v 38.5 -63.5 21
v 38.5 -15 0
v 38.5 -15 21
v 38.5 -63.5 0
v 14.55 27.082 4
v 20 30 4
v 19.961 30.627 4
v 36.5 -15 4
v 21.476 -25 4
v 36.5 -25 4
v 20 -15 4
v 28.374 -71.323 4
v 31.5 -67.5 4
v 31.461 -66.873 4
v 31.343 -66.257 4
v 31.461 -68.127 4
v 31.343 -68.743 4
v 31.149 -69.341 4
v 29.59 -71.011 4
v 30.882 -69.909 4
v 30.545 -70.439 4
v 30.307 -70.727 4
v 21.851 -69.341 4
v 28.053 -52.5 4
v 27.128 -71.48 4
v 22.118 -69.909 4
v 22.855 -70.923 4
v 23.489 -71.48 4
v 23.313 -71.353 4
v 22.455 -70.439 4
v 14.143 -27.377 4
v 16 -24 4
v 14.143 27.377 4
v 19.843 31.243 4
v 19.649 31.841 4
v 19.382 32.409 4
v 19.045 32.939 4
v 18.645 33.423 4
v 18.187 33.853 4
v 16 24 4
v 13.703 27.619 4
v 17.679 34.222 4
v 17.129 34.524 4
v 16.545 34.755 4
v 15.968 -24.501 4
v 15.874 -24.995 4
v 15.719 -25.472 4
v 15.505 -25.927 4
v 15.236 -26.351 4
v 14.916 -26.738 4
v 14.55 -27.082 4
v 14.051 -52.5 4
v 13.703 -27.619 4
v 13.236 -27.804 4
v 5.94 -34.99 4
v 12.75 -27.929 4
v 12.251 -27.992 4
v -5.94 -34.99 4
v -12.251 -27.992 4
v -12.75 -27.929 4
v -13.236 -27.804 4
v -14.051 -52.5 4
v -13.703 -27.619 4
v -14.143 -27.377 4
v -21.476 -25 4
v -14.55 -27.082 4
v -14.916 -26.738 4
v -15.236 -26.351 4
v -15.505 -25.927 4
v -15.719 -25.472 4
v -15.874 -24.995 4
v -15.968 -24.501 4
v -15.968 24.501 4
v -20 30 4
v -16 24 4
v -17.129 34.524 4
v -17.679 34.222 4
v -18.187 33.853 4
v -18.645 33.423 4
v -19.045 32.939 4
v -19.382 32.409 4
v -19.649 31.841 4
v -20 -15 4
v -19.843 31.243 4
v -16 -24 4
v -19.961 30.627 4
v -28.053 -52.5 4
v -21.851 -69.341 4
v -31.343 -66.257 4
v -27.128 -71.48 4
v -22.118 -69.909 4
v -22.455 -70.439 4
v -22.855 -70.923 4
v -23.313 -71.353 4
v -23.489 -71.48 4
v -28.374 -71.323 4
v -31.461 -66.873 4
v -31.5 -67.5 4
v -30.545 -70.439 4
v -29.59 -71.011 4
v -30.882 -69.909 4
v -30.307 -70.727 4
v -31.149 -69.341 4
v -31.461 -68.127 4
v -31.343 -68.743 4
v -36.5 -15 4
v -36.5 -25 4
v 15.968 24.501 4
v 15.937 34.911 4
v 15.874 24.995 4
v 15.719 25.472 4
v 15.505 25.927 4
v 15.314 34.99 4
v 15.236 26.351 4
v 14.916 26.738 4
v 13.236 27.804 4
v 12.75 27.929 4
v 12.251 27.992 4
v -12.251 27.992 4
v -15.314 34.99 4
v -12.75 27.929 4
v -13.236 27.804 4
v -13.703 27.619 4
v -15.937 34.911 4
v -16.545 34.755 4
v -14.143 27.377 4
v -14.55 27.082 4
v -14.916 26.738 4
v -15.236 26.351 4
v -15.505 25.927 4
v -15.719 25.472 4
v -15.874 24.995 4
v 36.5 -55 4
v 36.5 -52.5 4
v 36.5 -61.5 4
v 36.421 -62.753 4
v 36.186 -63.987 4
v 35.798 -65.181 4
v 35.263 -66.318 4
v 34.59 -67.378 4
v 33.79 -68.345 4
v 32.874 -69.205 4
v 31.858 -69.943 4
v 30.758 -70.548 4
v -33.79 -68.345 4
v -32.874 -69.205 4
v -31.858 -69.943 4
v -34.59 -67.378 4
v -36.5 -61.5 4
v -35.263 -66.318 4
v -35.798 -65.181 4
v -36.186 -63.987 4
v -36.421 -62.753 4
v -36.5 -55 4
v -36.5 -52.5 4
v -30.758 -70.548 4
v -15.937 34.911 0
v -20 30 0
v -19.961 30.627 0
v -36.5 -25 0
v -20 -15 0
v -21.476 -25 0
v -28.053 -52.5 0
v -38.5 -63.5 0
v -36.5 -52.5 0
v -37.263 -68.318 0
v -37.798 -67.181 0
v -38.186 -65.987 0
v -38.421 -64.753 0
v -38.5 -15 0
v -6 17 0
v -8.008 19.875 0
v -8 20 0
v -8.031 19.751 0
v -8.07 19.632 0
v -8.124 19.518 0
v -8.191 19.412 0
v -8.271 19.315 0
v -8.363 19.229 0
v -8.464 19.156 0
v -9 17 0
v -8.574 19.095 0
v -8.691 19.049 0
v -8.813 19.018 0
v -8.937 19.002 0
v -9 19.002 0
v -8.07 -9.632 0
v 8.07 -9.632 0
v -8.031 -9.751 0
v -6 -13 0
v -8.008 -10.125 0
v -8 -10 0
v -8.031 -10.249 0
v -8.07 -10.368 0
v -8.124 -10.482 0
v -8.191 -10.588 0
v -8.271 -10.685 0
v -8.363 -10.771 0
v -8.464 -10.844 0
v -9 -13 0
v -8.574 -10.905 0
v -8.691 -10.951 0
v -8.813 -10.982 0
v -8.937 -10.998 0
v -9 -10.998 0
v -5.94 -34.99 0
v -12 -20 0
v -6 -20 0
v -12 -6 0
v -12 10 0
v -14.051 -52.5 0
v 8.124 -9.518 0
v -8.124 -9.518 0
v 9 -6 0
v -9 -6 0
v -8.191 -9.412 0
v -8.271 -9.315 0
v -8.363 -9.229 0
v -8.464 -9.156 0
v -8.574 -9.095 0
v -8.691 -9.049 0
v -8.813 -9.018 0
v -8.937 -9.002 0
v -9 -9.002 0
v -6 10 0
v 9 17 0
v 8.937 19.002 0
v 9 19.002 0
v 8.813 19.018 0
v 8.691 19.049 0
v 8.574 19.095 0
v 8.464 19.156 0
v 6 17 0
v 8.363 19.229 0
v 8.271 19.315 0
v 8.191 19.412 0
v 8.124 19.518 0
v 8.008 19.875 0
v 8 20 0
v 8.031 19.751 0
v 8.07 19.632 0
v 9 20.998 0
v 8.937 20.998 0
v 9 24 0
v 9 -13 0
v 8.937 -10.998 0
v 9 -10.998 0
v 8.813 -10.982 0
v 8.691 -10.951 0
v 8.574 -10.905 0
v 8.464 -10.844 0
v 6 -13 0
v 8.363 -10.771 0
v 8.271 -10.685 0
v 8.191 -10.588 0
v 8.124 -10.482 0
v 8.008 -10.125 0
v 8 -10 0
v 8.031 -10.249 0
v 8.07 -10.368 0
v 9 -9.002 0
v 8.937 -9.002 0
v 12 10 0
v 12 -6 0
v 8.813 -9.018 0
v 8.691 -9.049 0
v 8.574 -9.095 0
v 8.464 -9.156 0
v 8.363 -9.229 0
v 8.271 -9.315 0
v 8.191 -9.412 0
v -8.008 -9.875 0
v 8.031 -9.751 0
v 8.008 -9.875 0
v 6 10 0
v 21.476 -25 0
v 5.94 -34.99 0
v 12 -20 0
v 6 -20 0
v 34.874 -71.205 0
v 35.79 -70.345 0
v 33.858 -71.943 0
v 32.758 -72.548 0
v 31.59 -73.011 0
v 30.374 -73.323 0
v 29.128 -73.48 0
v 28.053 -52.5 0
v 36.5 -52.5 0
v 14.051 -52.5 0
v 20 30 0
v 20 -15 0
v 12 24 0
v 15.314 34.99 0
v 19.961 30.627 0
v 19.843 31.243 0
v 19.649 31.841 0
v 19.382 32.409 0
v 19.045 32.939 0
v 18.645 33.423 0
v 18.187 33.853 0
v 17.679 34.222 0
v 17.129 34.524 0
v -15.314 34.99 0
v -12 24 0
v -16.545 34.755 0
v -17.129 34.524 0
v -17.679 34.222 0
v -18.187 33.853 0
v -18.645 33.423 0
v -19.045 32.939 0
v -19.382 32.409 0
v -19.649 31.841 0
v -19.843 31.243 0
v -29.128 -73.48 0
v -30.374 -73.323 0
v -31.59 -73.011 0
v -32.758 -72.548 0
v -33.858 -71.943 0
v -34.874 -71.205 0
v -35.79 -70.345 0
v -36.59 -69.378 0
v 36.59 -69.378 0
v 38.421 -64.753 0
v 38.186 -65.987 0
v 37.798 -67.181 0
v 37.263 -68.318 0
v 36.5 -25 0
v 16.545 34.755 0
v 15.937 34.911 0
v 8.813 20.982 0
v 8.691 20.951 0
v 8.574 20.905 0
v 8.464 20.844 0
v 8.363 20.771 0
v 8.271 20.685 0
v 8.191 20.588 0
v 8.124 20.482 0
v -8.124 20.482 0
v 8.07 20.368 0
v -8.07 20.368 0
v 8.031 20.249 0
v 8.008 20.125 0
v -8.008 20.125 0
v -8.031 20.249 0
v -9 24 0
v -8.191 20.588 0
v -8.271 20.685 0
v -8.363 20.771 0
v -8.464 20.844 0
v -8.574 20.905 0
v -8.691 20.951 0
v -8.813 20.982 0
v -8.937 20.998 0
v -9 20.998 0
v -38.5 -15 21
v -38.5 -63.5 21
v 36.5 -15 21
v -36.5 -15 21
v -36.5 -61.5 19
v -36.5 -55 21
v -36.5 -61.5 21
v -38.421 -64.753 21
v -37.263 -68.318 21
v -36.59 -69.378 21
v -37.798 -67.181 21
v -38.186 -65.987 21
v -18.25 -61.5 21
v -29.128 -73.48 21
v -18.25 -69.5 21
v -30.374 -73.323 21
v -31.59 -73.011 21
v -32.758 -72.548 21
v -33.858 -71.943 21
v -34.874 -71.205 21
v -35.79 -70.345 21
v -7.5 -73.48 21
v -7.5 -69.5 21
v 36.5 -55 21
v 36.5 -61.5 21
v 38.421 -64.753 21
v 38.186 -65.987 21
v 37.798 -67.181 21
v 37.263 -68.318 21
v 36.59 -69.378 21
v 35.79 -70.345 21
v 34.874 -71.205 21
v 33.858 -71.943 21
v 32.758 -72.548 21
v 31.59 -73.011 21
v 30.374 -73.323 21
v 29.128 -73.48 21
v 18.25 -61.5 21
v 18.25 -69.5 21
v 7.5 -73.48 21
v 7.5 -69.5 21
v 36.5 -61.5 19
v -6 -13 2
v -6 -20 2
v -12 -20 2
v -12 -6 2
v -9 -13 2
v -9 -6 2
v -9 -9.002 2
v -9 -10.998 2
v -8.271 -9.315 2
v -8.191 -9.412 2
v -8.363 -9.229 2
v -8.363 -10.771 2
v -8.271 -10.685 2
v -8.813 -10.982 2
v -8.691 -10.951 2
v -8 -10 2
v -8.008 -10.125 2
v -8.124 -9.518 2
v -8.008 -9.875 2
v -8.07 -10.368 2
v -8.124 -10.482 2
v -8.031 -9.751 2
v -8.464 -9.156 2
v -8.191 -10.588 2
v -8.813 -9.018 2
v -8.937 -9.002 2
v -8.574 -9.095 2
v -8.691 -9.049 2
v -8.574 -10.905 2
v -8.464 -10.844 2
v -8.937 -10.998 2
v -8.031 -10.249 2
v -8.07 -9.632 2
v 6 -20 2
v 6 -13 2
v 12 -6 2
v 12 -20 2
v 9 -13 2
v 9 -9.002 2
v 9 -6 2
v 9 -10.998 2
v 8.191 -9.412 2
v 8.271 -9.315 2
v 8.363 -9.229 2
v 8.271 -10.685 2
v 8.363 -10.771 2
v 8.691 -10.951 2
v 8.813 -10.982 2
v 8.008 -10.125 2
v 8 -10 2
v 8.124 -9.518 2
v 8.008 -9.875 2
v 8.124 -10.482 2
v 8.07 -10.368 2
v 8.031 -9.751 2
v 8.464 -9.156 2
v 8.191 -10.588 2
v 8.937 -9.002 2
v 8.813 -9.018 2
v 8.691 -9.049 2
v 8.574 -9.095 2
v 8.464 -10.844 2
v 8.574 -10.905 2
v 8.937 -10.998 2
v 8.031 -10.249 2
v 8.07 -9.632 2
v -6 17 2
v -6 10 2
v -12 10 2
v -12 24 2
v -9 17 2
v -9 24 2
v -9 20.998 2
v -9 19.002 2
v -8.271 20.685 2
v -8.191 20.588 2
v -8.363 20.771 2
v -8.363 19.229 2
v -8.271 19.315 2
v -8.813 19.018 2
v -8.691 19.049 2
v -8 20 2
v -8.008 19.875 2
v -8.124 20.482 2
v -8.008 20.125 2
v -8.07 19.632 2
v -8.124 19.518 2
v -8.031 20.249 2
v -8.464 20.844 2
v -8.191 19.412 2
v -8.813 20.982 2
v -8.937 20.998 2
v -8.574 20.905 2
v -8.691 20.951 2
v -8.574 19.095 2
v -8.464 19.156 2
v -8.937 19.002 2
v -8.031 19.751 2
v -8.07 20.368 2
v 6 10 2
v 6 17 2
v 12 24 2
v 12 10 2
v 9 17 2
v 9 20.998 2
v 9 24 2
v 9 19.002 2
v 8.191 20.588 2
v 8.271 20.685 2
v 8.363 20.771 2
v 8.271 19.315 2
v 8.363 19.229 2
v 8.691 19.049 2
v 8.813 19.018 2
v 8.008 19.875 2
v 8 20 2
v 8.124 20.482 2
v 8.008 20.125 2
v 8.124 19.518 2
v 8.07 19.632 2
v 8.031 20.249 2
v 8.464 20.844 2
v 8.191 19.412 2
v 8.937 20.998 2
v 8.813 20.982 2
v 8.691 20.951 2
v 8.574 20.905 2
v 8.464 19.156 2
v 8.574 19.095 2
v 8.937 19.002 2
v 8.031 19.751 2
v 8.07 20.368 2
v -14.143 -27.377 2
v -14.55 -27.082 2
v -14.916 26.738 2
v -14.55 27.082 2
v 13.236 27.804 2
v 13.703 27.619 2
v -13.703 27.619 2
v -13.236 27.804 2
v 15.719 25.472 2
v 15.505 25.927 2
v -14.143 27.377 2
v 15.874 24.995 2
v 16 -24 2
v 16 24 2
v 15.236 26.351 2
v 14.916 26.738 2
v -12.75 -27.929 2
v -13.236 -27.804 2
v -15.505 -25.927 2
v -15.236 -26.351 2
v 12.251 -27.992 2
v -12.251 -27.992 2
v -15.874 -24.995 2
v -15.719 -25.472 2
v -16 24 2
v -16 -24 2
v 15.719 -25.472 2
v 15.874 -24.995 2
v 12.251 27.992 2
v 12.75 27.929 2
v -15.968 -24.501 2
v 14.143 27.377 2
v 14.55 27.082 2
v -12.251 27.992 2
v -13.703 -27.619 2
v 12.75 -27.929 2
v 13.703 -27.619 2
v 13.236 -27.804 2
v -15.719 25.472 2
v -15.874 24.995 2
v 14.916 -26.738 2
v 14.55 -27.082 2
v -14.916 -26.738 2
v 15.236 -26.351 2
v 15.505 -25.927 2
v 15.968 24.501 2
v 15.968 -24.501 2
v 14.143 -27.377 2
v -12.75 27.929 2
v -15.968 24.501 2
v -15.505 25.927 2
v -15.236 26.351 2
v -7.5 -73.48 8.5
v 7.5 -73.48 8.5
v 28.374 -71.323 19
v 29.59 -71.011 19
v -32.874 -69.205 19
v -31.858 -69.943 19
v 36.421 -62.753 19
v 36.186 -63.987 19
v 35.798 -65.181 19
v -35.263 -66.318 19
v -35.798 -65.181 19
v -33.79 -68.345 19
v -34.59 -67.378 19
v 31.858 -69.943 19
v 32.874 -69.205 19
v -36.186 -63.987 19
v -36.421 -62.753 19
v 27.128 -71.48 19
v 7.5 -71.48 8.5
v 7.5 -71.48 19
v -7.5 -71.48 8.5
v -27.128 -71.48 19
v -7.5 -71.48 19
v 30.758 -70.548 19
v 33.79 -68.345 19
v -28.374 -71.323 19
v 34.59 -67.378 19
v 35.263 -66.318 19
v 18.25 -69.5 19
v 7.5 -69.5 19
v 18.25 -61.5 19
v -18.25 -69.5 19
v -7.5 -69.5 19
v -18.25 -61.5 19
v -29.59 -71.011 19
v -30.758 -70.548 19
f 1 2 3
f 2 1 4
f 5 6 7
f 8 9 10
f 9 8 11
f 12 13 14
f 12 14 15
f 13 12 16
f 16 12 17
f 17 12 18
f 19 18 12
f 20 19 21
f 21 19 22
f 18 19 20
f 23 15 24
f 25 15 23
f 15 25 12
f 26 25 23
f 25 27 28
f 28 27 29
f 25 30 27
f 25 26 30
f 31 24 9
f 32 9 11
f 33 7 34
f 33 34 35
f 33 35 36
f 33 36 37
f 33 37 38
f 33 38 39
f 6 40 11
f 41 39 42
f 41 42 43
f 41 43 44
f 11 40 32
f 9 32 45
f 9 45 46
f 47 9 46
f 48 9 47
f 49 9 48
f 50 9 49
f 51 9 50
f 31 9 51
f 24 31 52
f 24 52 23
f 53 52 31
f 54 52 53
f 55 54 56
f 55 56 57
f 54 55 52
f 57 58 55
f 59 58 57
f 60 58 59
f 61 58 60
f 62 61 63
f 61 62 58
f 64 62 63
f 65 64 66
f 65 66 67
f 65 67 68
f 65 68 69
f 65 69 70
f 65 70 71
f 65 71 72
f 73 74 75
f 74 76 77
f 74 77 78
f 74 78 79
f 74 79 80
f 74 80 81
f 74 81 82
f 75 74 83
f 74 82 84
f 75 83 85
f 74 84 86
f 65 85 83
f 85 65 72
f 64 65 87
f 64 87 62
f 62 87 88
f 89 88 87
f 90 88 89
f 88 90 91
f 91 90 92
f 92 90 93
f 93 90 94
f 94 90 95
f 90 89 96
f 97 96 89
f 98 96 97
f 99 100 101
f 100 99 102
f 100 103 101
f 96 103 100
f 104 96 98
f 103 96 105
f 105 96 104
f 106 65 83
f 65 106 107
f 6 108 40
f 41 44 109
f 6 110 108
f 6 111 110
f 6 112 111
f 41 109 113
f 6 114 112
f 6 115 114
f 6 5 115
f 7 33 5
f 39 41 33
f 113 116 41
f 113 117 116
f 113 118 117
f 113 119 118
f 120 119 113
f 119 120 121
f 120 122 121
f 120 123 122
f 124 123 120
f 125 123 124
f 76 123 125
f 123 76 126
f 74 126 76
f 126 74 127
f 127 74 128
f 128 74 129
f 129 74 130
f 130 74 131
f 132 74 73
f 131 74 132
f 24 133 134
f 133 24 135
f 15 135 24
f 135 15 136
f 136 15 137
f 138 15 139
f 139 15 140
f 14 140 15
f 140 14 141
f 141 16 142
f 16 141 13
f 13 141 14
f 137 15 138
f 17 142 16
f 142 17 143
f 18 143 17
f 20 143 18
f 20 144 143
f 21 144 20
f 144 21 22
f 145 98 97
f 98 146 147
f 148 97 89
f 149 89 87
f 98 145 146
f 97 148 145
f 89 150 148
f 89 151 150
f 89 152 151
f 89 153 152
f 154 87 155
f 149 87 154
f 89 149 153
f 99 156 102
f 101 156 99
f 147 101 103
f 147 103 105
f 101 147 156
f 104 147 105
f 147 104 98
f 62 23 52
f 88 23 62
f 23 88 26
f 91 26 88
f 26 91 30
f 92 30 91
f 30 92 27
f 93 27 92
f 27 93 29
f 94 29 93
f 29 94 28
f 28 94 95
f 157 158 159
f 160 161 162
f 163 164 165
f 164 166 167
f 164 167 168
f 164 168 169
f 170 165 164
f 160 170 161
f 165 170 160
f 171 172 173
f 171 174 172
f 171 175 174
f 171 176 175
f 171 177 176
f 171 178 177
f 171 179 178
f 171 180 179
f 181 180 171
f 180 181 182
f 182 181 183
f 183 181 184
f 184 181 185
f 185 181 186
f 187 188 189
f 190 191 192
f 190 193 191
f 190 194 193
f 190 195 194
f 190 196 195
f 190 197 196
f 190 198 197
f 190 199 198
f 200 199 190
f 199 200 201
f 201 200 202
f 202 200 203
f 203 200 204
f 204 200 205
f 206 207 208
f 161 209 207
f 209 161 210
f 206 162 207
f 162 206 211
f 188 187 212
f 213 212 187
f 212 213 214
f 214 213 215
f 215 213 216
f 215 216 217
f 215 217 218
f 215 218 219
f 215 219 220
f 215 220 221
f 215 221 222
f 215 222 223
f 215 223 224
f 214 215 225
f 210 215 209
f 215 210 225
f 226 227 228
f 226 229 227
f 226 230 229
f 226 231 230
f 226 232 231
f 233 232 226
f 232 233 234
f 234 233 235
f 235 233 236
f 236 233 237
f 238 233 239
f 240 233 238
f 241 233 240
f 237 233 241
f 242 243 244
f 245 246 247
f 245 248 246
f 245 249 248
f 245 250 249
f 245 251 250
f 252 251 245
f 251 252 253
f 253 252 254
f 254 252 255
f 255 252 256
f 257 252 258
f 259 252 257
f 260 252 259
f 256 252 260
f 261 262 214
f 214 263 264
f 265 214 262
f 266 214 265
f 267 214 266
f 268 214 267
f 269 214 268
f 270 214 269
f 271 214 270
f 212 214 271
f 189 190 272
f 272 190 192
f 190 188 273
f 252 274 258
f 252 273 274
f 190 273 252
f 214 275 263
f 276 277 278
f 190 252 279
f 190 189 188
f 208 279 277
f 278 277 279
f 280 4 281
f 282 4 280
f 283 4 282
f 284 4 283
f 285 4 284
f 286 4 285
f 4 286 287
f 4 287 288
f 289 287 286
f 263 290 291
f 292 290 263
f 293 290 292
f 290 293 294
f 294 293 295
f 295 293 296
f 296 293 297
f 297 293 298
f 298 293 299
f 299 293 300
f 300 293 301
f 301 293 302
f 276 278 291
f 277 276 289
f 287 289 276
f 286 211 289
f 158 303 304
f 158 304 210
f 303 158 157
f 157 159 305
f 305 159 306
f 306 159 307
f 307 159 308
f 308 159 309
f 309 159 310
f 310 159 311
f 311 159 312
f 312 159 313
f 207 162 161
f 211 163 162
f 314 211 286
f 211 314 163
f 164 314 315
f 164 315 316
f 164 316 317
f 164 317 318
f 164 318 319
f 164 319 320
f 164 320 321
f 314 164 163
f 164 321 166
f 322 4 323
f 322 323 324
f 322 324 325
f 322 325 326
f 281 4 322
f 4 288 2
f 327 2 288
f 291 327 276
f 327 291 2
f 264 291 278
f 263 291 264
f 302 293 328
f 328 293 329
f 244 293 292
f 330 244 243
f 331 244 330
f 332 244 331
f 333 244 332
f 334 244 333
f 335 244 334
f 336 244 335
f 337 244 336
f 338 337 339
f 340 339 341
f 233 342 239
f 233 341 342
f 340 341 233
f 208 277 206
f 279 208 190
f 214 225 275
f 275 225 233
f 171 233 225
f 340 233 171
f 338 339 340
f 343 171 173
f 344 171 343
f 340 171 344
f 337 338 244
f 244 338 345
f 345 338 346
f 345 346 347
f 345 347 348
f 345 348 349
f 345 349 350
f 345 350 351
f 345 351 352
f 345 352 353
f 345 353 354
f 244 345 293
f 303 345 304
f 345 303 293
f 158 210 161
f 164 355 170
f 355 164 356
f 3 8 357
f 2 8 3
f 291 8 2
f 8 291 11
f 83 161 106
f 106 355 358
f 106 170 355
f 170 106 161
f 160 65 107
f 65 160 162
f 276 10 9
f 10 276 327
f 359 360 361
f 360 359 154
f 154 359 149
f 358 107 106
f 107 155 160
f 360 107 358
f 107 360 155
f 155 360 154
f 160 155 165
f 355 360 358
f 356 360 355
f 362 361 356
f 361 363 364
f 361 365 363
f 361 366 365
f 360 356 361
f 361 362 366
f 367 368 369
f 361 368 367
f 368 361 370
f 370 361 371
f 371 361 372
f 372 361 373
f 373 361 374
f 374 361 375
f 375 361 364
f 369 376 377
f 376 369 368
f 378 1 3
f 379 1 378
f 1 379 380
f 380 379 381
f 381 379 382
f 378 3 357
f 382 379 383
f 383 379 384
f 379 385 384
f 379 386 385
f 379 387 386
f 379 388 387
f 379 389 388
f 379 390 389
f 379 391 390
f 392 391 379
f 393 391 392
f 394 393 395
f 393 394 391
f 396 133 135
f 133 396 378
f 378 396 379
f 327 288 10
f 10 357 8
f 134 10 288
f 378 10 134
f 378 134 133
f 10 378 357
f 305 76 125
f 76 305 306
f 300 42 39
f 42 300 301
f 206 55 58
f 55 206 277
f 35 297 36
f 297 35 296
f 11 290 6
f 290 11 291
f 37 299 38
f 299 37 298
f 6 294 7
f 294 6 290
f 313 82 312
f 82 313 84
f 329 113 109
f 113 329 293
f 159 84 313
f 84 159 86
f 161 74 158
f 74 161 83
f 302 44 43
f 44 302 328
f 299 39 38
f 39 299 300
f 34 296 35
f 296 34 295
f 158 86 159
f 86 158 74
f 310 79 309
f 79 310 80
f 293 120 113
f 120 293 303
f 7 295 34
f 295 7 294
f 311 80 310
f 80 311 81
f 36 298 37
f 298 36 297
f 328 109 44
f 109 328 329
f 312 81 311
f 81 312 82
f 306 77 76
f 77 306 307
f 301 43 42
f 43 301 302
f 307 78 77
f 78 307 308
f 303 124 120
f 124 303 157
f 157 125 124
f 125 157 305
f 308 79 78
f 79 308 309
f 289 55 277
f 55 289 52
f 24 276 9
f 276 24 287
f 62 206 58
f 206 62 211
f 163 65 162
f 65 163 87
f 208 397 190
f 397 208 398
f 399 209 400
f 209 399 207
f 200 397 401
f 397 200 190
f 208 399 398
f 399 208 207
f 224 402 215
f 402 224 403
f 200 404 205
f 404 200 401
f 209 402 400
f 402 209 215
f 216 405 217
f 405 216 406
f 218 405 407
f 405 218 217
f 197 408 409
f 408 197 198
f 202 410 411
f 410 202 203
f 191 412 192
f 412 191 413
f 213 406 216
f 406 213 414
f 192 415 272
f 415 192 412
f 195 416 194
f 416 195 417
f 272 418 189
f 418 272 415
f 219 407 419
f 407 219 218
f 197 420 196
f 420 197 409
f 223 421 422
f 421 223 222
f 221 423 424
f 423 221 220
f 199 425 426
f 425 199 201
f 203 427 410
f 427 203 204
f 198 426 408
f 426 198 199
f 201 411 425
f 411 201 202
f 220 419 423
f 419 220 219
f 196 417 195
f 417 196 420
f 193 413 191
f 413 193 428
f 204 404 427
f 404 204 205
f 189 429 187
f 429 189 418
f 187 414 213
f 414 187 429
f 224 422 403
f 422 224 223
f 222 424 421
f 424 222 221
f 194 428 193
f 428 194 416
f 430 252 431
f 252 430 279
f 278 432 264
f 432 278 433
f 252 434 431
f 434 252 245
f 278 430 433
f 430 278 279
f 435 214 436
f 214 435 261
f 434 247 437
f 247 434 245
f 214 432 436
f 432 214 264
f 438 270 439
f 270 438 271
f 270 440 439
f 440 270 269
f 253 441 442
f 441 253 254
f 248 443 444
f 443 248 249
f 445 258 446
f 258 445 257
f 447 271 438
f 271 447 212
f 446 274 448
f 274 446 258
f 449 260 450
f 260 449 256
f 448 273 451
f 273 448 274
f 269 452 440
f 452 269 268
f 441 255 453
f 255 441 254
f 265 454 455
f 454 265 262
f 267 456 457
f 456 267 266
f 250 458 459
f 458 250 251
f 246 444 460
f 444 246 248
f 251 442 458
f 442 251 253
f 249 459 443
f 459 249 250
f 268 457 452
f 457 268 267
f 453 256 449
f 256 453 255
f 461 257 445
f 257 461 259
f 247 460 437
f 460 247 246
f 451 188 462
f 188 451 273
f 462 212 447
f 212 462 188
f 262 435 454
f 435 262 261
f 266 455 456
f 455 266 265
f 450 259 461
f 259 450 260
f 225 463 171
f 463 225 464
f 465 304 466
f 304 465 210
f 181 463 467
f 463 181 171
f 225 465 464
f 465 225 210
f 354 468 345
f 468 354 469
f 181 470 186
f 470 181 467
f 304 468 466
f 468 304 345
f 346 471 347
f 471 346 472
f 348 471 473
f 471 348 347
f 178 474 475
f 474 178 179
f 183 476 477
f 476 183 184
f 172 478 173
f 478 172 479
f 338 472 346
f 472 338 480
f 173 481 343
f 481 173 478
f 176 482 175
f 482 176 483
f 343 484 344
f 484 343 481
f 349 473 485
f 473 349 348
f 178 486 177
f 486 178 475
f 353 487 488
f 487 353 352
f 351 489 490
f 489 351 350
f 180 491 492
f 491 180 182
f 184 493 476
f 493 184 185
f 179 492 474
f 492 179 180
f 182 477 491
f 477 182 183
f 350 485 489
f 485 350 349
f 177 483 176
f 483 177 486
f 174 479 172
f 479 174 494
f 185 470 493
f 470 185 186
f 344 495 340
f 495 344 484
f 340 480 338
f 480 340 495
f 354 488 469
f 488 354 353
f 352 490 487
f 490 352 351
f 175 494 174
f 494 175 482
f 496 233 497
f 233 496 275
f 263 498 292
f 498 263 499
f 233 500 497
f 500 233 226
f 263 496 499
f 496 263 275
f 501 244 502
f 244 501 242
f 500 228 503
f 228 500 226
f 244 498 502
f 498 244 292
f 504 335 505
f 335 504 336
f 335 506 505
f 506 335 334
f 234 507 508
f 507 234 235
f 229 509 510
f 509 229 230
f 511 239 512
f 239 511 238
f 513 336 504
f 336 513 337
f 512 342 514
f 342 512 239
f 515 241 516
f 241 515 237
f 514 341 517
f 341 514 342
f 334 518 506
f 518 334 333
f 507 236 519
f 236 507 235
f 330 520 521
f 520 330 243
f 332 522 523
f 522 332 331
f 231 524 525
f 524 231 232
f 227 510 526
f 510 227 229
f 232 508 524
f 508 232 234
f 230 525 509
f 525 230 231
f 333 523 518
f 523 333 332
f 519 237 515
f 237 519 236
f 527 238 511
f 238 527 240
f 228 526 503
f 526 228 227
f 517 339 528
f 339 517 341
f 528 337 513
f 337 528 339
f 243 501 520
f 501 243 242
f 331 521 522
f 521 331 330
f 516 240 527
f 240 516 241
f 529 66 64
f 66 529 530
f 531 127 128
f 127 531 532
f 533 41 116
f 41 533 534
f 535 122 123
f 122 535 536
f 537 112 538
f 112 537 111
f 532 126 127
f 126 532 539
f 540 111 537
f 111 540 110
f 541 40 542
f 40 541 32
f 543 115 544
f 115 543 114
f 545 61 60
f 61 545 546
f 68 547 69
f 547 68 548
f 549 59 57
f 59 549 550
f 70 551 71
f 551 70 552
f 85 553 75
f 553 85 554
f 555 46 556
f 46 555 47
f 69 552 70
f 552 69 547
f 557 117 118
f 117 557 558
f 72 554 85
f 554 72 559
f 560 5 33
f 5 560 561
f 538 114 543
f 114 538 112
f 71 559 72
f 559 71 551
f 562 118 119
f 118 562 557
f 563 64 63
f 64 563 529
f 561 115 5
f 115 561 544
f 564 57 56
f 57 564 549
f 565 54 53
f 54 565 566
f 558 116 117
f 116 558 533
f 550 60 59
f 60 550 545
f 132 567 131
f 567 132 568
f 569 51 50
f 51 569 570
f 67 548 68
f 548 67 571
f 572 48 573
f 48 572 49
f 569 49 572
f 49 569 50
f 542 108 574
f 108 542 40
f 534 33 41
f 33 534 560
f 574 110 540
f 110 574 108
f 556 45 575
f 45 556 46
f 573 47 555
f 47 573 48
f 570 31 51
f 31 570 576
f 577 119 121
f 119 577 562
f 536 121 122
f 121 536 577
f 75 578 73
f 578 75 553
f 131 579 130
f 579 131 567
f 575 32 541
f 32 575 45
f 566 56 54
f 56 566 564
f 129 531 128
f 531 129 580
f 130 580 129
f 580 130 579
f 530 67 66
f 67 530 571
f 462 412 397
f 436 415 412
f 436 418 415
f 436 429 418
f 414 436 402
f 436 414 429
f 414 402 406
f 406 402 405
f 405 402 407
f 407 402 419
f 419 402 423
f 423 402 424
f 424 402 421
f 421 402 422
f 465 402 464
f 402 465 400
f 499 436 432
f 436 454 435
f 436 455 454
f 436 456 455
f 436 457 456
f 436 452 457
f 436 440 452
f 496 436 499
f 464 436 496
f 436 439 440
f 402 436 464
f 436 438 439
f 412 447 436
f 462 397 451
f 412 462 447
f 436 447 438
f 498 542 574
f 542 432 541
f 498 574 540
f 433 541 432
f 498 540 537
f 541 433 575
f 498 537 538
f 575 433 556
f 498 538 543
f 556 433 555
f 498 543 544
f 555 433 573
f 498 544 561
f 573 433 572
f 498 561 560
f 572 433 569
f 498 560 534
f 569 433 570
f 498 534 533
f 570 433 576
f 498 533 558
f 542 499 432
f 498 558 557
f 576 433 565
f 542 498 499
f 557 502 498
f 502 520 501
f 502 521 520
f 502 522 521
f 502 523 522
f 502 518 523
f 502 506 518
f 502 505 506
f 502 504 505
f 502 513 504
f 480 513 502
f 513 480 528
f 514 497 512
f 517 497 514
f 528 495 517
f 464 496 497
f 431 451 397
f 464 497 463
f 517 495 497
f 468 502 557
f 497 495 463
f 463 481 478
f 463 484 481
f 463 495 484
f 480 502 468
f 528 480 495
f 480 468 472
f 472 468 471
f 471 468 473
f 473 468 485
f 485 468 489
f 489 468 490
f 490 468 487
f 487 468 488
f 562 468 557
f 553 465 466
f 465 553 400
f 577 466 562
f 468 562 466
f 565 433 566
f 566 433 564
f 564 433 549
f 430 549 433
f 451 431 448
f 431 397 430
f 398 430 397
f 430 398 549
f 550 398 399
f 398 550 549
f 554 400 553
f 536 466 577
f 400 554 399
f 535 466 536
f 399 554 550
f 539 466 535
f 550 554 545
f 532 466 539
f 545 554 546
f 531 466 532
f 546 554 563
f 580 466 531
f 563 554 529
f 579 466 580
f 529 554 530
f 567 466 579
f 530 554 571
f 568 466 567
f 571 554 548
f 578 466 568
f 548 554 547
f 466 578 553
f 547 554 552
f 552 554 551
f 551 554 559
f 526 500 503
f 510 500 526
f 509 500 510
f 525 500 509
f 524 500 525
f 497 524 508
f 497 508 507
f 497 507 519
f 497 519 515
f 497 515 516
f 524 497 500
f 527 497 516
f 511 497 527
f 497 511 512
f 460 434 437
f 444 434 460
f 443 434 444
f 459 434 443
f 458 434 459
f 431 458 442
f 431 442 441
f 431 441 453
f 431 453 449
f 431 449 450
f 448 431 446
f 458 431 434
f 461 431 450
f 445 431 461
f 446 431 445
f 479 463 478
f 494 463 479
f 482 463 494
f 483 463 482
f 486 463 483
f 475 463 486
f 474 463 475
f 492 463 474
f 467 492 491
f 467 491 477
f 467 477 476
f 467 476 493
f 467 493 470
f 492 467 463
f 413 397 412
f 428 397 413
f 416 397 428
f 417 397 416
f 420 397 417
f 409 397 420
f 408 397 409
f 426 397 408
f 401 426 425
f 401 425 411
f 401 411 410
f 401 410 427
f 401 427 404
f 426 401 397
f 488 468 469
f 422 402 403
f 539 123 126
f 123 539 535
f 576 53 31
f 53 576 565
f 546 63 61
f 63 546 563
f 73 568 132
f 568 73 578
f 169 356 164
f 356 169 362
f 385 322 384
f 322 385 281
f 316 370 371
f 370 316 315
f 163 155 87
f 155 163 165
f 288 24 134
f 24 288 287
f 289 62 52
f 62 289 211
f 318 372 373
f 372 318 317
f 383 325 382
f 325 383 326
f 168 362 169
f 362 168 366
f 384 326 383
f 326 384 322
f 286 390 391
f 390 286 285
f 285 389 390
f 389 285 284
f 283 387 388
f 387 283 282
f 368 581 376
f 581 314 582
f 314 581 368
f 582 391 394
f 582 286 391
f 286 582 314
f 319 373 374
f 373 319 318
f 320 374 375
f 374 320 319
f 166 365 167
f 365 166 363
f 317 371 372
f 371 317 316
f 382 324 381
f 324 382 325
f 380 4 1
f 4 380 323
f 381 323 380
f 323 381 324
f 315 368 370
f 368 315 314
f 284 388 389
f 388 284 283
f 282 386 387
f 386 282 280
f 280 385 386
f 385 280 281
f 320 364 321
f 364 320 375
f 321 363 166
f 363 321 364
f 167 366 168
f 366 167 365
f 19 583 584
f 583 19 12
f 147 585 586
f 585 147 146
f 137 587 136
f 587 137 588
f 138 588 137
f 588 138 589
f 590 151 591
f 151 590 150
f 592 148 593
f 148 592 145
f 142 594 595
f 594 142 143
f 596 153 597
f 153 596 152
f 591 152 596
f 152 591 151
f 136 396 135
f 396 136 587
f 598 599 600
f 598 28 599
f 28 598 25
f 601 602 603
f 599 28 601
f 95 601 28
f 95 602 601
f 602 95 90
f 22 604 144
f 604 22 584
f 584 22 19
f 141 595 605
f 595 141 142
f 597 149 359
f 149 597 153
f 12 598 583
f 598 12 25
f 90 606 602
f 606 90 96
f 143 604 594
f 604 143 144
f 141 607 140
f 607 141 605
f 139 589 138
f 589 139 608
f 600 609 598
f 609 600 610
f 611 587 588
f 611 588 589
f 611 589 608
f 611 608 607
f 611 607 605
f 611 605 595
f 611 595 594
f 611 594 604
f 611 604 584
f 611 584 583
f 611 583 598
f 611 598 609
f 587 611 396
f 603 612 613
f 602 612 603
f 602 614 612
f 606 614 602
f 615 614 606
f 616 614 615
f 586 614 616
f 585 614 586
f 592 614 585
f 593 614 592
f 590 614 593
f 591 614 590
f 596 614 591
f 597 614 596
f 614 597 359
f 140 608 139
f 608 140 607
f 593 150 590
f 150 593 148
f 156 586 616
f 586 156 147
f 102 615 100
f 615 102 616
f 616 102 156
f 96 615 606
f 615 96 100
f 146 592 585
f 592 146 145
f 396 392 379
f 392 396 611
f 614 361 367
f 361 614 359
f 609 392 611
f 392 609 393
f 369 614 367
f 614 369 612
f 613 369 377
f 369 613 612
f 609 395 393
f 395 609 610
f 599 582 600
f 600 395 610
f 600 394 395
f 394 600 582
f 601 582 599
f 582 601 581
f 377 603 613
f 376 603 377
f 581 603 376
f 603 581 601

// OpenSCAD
phone_width = 73;
phone_length = 143;
phone_height = 15;
radius_phone = 10;

/* [Hidden] */
height = 4;
radius = 5;

$fn=50;

//phone();

difference() {
    union() {
        difference() {
            base_plate();
        }
        lower_connector();
        mirror([1,0,0]) lower_connector();
        // No upper connector
        //upper_connector();
        middle_part();
    }
    translate([0,0,height-2]) scale([0.8,0.8,1]) base_plate(); 
    mount_grid();
}

lower_part();
// No upper part
//upper_part();


module phone() {    
    color("blue", 0.2) hull() {
        translate([phone_width/2-radius_phone, phone_length/2-radius_phone, height]) cylinder(r=radius_phone,h=phone_height);
        translate([phone_width/2-radius_phone, -phone_length/2+radius_phone, height]) cylinder(r=radius_phone,h=phone_height);
        translate([-phone_width/2+radius_phone, phone_length/2-radius_phone, height]) cylinder(r=radius_phone,h=phone_height);
        translate([-phone_width/2+radius_phone, -phone_length/2+radius_phone, height]) cylinder(r=radius_phone,h=phone_height);
    }
}

module base_plate() {
    hull() {
        translate([15, 30, 0]) cylinder(r=radius,h=height);
        translate([15, -30, 0]) cylinder(r=radius,h=height);
        translate([-15, 30, 0]) cylinder(r=radius,h=height);
        translate([-15, -30, 0]) cylinder(r=radius,h=height);
    }
}

module upper_connector() {
    hull() {
        translate([0, 20, height/2]) cube([4*radius, 4*radius, height], center = true);
        translate([0, phone_length/2, height/2]) cube([2*radius, 2*radius, height], center = true);
    }
}

module upper_part() {
    translate([0, phone_length/2+radius, 1]) rotate([0,90,0]) {
        hull() {
            cylinder(r=1,h=2*radius, center=true);
            translate([-phone_height+2, 0, 0]) cylinder(r=0.5,h=2*radius, center=true);
        }        
        translate([-phone_height-4, 0, 0]) difference() {
            cylinder(r=6, h=2*radius, center=true);
            cylinder(r=5, h=2*radius, center=true);
            translate([-10,0.5,-10]) cube([20, 10, 20]);
            translate([-15,-12,-10]) rotate([0,0,45]) cube([20, 10, 20]);
        }
        #translate([-phone_height-12,-5.5,-radius]) rotate([0,0,45])  cube([radius, 1, 2*radius]);
    }
}

module lower_connector() {
    hull() {
        translate([10, -20, 0]) cylinder(r=2*radius,h=height);
        translate([phone_width/2-10, -phone_length/2+4, 0]) cylinder(r=radius,h=height);
    }
    // No rotation of lower part
    //translate([phone_width/2-10, -phone_length/2+4, 0]) cylinder(r=radius,h=7);
}

module lower_part() {
    // No rotation of lower part
    rotate([/*-5*/0,0,0]) difference() {
        hull() {
            translate([0, -phone_length/2+18, (phone_height + 2+height)/2]) cube([phone_width + 4, 2, phone_height + 2+height], center=true);
            translate([-phone_width/2+radius+3, -phone_length/2+radius_phone - 2, 0]) cylinder(r=radius_phone,h=phone_height + 2+height);
            translate([phone_width/2-radius-3, -phone_length/2+radius_phone - 2, 0]) cylinder(r=radius_phone,h=phone_height + 2+height);
        }
        phone();
        // cut out for display
        translate([0,10,20]) cube([phone_width, phone_length, phone_height], center=true);
        // cut out for microphone
        translate([0,2,20]) cube([phone_width/2, phone_length, phone_height], center=true);
        // cut out for charger
        translate([0,-12,16]) cube([15, phone_length, phone_height], center=true);
    }
}

module middle_part() {
    translate([0,-20,height/2]) {
        cube([phone_width+4, 10, height], center = true);
        translate([-phone_width/2-2,-35,-height/2]) cube([2, 40, phone_height + 2+height]);
        translate([phone_width/2,-35,-height/2]) cube([2, 40, phone_height + 2+height]);
    }
}

module mount_grid() {
    translate([-10.5, -20, 0]) mount_grid_module();
    translate([10.5, -20, 0]) mirror([180,0,0]) mount_grid_module();
    translate([-10.5, 10, 0]) mount_grid_module();
    translate([10.5, 10, 0]) mirror([180,0,0]) mount_grid_module();
}

module mount_grid_module() {    
    translate([-1.5, 0, -10]) cube([6, 7, 20]);
    translate([-1.5, 7, -10]) cube([3, 7, 20]);
    translate([1.5, 10, -10]) cylinder(r=1,h=20);
}
